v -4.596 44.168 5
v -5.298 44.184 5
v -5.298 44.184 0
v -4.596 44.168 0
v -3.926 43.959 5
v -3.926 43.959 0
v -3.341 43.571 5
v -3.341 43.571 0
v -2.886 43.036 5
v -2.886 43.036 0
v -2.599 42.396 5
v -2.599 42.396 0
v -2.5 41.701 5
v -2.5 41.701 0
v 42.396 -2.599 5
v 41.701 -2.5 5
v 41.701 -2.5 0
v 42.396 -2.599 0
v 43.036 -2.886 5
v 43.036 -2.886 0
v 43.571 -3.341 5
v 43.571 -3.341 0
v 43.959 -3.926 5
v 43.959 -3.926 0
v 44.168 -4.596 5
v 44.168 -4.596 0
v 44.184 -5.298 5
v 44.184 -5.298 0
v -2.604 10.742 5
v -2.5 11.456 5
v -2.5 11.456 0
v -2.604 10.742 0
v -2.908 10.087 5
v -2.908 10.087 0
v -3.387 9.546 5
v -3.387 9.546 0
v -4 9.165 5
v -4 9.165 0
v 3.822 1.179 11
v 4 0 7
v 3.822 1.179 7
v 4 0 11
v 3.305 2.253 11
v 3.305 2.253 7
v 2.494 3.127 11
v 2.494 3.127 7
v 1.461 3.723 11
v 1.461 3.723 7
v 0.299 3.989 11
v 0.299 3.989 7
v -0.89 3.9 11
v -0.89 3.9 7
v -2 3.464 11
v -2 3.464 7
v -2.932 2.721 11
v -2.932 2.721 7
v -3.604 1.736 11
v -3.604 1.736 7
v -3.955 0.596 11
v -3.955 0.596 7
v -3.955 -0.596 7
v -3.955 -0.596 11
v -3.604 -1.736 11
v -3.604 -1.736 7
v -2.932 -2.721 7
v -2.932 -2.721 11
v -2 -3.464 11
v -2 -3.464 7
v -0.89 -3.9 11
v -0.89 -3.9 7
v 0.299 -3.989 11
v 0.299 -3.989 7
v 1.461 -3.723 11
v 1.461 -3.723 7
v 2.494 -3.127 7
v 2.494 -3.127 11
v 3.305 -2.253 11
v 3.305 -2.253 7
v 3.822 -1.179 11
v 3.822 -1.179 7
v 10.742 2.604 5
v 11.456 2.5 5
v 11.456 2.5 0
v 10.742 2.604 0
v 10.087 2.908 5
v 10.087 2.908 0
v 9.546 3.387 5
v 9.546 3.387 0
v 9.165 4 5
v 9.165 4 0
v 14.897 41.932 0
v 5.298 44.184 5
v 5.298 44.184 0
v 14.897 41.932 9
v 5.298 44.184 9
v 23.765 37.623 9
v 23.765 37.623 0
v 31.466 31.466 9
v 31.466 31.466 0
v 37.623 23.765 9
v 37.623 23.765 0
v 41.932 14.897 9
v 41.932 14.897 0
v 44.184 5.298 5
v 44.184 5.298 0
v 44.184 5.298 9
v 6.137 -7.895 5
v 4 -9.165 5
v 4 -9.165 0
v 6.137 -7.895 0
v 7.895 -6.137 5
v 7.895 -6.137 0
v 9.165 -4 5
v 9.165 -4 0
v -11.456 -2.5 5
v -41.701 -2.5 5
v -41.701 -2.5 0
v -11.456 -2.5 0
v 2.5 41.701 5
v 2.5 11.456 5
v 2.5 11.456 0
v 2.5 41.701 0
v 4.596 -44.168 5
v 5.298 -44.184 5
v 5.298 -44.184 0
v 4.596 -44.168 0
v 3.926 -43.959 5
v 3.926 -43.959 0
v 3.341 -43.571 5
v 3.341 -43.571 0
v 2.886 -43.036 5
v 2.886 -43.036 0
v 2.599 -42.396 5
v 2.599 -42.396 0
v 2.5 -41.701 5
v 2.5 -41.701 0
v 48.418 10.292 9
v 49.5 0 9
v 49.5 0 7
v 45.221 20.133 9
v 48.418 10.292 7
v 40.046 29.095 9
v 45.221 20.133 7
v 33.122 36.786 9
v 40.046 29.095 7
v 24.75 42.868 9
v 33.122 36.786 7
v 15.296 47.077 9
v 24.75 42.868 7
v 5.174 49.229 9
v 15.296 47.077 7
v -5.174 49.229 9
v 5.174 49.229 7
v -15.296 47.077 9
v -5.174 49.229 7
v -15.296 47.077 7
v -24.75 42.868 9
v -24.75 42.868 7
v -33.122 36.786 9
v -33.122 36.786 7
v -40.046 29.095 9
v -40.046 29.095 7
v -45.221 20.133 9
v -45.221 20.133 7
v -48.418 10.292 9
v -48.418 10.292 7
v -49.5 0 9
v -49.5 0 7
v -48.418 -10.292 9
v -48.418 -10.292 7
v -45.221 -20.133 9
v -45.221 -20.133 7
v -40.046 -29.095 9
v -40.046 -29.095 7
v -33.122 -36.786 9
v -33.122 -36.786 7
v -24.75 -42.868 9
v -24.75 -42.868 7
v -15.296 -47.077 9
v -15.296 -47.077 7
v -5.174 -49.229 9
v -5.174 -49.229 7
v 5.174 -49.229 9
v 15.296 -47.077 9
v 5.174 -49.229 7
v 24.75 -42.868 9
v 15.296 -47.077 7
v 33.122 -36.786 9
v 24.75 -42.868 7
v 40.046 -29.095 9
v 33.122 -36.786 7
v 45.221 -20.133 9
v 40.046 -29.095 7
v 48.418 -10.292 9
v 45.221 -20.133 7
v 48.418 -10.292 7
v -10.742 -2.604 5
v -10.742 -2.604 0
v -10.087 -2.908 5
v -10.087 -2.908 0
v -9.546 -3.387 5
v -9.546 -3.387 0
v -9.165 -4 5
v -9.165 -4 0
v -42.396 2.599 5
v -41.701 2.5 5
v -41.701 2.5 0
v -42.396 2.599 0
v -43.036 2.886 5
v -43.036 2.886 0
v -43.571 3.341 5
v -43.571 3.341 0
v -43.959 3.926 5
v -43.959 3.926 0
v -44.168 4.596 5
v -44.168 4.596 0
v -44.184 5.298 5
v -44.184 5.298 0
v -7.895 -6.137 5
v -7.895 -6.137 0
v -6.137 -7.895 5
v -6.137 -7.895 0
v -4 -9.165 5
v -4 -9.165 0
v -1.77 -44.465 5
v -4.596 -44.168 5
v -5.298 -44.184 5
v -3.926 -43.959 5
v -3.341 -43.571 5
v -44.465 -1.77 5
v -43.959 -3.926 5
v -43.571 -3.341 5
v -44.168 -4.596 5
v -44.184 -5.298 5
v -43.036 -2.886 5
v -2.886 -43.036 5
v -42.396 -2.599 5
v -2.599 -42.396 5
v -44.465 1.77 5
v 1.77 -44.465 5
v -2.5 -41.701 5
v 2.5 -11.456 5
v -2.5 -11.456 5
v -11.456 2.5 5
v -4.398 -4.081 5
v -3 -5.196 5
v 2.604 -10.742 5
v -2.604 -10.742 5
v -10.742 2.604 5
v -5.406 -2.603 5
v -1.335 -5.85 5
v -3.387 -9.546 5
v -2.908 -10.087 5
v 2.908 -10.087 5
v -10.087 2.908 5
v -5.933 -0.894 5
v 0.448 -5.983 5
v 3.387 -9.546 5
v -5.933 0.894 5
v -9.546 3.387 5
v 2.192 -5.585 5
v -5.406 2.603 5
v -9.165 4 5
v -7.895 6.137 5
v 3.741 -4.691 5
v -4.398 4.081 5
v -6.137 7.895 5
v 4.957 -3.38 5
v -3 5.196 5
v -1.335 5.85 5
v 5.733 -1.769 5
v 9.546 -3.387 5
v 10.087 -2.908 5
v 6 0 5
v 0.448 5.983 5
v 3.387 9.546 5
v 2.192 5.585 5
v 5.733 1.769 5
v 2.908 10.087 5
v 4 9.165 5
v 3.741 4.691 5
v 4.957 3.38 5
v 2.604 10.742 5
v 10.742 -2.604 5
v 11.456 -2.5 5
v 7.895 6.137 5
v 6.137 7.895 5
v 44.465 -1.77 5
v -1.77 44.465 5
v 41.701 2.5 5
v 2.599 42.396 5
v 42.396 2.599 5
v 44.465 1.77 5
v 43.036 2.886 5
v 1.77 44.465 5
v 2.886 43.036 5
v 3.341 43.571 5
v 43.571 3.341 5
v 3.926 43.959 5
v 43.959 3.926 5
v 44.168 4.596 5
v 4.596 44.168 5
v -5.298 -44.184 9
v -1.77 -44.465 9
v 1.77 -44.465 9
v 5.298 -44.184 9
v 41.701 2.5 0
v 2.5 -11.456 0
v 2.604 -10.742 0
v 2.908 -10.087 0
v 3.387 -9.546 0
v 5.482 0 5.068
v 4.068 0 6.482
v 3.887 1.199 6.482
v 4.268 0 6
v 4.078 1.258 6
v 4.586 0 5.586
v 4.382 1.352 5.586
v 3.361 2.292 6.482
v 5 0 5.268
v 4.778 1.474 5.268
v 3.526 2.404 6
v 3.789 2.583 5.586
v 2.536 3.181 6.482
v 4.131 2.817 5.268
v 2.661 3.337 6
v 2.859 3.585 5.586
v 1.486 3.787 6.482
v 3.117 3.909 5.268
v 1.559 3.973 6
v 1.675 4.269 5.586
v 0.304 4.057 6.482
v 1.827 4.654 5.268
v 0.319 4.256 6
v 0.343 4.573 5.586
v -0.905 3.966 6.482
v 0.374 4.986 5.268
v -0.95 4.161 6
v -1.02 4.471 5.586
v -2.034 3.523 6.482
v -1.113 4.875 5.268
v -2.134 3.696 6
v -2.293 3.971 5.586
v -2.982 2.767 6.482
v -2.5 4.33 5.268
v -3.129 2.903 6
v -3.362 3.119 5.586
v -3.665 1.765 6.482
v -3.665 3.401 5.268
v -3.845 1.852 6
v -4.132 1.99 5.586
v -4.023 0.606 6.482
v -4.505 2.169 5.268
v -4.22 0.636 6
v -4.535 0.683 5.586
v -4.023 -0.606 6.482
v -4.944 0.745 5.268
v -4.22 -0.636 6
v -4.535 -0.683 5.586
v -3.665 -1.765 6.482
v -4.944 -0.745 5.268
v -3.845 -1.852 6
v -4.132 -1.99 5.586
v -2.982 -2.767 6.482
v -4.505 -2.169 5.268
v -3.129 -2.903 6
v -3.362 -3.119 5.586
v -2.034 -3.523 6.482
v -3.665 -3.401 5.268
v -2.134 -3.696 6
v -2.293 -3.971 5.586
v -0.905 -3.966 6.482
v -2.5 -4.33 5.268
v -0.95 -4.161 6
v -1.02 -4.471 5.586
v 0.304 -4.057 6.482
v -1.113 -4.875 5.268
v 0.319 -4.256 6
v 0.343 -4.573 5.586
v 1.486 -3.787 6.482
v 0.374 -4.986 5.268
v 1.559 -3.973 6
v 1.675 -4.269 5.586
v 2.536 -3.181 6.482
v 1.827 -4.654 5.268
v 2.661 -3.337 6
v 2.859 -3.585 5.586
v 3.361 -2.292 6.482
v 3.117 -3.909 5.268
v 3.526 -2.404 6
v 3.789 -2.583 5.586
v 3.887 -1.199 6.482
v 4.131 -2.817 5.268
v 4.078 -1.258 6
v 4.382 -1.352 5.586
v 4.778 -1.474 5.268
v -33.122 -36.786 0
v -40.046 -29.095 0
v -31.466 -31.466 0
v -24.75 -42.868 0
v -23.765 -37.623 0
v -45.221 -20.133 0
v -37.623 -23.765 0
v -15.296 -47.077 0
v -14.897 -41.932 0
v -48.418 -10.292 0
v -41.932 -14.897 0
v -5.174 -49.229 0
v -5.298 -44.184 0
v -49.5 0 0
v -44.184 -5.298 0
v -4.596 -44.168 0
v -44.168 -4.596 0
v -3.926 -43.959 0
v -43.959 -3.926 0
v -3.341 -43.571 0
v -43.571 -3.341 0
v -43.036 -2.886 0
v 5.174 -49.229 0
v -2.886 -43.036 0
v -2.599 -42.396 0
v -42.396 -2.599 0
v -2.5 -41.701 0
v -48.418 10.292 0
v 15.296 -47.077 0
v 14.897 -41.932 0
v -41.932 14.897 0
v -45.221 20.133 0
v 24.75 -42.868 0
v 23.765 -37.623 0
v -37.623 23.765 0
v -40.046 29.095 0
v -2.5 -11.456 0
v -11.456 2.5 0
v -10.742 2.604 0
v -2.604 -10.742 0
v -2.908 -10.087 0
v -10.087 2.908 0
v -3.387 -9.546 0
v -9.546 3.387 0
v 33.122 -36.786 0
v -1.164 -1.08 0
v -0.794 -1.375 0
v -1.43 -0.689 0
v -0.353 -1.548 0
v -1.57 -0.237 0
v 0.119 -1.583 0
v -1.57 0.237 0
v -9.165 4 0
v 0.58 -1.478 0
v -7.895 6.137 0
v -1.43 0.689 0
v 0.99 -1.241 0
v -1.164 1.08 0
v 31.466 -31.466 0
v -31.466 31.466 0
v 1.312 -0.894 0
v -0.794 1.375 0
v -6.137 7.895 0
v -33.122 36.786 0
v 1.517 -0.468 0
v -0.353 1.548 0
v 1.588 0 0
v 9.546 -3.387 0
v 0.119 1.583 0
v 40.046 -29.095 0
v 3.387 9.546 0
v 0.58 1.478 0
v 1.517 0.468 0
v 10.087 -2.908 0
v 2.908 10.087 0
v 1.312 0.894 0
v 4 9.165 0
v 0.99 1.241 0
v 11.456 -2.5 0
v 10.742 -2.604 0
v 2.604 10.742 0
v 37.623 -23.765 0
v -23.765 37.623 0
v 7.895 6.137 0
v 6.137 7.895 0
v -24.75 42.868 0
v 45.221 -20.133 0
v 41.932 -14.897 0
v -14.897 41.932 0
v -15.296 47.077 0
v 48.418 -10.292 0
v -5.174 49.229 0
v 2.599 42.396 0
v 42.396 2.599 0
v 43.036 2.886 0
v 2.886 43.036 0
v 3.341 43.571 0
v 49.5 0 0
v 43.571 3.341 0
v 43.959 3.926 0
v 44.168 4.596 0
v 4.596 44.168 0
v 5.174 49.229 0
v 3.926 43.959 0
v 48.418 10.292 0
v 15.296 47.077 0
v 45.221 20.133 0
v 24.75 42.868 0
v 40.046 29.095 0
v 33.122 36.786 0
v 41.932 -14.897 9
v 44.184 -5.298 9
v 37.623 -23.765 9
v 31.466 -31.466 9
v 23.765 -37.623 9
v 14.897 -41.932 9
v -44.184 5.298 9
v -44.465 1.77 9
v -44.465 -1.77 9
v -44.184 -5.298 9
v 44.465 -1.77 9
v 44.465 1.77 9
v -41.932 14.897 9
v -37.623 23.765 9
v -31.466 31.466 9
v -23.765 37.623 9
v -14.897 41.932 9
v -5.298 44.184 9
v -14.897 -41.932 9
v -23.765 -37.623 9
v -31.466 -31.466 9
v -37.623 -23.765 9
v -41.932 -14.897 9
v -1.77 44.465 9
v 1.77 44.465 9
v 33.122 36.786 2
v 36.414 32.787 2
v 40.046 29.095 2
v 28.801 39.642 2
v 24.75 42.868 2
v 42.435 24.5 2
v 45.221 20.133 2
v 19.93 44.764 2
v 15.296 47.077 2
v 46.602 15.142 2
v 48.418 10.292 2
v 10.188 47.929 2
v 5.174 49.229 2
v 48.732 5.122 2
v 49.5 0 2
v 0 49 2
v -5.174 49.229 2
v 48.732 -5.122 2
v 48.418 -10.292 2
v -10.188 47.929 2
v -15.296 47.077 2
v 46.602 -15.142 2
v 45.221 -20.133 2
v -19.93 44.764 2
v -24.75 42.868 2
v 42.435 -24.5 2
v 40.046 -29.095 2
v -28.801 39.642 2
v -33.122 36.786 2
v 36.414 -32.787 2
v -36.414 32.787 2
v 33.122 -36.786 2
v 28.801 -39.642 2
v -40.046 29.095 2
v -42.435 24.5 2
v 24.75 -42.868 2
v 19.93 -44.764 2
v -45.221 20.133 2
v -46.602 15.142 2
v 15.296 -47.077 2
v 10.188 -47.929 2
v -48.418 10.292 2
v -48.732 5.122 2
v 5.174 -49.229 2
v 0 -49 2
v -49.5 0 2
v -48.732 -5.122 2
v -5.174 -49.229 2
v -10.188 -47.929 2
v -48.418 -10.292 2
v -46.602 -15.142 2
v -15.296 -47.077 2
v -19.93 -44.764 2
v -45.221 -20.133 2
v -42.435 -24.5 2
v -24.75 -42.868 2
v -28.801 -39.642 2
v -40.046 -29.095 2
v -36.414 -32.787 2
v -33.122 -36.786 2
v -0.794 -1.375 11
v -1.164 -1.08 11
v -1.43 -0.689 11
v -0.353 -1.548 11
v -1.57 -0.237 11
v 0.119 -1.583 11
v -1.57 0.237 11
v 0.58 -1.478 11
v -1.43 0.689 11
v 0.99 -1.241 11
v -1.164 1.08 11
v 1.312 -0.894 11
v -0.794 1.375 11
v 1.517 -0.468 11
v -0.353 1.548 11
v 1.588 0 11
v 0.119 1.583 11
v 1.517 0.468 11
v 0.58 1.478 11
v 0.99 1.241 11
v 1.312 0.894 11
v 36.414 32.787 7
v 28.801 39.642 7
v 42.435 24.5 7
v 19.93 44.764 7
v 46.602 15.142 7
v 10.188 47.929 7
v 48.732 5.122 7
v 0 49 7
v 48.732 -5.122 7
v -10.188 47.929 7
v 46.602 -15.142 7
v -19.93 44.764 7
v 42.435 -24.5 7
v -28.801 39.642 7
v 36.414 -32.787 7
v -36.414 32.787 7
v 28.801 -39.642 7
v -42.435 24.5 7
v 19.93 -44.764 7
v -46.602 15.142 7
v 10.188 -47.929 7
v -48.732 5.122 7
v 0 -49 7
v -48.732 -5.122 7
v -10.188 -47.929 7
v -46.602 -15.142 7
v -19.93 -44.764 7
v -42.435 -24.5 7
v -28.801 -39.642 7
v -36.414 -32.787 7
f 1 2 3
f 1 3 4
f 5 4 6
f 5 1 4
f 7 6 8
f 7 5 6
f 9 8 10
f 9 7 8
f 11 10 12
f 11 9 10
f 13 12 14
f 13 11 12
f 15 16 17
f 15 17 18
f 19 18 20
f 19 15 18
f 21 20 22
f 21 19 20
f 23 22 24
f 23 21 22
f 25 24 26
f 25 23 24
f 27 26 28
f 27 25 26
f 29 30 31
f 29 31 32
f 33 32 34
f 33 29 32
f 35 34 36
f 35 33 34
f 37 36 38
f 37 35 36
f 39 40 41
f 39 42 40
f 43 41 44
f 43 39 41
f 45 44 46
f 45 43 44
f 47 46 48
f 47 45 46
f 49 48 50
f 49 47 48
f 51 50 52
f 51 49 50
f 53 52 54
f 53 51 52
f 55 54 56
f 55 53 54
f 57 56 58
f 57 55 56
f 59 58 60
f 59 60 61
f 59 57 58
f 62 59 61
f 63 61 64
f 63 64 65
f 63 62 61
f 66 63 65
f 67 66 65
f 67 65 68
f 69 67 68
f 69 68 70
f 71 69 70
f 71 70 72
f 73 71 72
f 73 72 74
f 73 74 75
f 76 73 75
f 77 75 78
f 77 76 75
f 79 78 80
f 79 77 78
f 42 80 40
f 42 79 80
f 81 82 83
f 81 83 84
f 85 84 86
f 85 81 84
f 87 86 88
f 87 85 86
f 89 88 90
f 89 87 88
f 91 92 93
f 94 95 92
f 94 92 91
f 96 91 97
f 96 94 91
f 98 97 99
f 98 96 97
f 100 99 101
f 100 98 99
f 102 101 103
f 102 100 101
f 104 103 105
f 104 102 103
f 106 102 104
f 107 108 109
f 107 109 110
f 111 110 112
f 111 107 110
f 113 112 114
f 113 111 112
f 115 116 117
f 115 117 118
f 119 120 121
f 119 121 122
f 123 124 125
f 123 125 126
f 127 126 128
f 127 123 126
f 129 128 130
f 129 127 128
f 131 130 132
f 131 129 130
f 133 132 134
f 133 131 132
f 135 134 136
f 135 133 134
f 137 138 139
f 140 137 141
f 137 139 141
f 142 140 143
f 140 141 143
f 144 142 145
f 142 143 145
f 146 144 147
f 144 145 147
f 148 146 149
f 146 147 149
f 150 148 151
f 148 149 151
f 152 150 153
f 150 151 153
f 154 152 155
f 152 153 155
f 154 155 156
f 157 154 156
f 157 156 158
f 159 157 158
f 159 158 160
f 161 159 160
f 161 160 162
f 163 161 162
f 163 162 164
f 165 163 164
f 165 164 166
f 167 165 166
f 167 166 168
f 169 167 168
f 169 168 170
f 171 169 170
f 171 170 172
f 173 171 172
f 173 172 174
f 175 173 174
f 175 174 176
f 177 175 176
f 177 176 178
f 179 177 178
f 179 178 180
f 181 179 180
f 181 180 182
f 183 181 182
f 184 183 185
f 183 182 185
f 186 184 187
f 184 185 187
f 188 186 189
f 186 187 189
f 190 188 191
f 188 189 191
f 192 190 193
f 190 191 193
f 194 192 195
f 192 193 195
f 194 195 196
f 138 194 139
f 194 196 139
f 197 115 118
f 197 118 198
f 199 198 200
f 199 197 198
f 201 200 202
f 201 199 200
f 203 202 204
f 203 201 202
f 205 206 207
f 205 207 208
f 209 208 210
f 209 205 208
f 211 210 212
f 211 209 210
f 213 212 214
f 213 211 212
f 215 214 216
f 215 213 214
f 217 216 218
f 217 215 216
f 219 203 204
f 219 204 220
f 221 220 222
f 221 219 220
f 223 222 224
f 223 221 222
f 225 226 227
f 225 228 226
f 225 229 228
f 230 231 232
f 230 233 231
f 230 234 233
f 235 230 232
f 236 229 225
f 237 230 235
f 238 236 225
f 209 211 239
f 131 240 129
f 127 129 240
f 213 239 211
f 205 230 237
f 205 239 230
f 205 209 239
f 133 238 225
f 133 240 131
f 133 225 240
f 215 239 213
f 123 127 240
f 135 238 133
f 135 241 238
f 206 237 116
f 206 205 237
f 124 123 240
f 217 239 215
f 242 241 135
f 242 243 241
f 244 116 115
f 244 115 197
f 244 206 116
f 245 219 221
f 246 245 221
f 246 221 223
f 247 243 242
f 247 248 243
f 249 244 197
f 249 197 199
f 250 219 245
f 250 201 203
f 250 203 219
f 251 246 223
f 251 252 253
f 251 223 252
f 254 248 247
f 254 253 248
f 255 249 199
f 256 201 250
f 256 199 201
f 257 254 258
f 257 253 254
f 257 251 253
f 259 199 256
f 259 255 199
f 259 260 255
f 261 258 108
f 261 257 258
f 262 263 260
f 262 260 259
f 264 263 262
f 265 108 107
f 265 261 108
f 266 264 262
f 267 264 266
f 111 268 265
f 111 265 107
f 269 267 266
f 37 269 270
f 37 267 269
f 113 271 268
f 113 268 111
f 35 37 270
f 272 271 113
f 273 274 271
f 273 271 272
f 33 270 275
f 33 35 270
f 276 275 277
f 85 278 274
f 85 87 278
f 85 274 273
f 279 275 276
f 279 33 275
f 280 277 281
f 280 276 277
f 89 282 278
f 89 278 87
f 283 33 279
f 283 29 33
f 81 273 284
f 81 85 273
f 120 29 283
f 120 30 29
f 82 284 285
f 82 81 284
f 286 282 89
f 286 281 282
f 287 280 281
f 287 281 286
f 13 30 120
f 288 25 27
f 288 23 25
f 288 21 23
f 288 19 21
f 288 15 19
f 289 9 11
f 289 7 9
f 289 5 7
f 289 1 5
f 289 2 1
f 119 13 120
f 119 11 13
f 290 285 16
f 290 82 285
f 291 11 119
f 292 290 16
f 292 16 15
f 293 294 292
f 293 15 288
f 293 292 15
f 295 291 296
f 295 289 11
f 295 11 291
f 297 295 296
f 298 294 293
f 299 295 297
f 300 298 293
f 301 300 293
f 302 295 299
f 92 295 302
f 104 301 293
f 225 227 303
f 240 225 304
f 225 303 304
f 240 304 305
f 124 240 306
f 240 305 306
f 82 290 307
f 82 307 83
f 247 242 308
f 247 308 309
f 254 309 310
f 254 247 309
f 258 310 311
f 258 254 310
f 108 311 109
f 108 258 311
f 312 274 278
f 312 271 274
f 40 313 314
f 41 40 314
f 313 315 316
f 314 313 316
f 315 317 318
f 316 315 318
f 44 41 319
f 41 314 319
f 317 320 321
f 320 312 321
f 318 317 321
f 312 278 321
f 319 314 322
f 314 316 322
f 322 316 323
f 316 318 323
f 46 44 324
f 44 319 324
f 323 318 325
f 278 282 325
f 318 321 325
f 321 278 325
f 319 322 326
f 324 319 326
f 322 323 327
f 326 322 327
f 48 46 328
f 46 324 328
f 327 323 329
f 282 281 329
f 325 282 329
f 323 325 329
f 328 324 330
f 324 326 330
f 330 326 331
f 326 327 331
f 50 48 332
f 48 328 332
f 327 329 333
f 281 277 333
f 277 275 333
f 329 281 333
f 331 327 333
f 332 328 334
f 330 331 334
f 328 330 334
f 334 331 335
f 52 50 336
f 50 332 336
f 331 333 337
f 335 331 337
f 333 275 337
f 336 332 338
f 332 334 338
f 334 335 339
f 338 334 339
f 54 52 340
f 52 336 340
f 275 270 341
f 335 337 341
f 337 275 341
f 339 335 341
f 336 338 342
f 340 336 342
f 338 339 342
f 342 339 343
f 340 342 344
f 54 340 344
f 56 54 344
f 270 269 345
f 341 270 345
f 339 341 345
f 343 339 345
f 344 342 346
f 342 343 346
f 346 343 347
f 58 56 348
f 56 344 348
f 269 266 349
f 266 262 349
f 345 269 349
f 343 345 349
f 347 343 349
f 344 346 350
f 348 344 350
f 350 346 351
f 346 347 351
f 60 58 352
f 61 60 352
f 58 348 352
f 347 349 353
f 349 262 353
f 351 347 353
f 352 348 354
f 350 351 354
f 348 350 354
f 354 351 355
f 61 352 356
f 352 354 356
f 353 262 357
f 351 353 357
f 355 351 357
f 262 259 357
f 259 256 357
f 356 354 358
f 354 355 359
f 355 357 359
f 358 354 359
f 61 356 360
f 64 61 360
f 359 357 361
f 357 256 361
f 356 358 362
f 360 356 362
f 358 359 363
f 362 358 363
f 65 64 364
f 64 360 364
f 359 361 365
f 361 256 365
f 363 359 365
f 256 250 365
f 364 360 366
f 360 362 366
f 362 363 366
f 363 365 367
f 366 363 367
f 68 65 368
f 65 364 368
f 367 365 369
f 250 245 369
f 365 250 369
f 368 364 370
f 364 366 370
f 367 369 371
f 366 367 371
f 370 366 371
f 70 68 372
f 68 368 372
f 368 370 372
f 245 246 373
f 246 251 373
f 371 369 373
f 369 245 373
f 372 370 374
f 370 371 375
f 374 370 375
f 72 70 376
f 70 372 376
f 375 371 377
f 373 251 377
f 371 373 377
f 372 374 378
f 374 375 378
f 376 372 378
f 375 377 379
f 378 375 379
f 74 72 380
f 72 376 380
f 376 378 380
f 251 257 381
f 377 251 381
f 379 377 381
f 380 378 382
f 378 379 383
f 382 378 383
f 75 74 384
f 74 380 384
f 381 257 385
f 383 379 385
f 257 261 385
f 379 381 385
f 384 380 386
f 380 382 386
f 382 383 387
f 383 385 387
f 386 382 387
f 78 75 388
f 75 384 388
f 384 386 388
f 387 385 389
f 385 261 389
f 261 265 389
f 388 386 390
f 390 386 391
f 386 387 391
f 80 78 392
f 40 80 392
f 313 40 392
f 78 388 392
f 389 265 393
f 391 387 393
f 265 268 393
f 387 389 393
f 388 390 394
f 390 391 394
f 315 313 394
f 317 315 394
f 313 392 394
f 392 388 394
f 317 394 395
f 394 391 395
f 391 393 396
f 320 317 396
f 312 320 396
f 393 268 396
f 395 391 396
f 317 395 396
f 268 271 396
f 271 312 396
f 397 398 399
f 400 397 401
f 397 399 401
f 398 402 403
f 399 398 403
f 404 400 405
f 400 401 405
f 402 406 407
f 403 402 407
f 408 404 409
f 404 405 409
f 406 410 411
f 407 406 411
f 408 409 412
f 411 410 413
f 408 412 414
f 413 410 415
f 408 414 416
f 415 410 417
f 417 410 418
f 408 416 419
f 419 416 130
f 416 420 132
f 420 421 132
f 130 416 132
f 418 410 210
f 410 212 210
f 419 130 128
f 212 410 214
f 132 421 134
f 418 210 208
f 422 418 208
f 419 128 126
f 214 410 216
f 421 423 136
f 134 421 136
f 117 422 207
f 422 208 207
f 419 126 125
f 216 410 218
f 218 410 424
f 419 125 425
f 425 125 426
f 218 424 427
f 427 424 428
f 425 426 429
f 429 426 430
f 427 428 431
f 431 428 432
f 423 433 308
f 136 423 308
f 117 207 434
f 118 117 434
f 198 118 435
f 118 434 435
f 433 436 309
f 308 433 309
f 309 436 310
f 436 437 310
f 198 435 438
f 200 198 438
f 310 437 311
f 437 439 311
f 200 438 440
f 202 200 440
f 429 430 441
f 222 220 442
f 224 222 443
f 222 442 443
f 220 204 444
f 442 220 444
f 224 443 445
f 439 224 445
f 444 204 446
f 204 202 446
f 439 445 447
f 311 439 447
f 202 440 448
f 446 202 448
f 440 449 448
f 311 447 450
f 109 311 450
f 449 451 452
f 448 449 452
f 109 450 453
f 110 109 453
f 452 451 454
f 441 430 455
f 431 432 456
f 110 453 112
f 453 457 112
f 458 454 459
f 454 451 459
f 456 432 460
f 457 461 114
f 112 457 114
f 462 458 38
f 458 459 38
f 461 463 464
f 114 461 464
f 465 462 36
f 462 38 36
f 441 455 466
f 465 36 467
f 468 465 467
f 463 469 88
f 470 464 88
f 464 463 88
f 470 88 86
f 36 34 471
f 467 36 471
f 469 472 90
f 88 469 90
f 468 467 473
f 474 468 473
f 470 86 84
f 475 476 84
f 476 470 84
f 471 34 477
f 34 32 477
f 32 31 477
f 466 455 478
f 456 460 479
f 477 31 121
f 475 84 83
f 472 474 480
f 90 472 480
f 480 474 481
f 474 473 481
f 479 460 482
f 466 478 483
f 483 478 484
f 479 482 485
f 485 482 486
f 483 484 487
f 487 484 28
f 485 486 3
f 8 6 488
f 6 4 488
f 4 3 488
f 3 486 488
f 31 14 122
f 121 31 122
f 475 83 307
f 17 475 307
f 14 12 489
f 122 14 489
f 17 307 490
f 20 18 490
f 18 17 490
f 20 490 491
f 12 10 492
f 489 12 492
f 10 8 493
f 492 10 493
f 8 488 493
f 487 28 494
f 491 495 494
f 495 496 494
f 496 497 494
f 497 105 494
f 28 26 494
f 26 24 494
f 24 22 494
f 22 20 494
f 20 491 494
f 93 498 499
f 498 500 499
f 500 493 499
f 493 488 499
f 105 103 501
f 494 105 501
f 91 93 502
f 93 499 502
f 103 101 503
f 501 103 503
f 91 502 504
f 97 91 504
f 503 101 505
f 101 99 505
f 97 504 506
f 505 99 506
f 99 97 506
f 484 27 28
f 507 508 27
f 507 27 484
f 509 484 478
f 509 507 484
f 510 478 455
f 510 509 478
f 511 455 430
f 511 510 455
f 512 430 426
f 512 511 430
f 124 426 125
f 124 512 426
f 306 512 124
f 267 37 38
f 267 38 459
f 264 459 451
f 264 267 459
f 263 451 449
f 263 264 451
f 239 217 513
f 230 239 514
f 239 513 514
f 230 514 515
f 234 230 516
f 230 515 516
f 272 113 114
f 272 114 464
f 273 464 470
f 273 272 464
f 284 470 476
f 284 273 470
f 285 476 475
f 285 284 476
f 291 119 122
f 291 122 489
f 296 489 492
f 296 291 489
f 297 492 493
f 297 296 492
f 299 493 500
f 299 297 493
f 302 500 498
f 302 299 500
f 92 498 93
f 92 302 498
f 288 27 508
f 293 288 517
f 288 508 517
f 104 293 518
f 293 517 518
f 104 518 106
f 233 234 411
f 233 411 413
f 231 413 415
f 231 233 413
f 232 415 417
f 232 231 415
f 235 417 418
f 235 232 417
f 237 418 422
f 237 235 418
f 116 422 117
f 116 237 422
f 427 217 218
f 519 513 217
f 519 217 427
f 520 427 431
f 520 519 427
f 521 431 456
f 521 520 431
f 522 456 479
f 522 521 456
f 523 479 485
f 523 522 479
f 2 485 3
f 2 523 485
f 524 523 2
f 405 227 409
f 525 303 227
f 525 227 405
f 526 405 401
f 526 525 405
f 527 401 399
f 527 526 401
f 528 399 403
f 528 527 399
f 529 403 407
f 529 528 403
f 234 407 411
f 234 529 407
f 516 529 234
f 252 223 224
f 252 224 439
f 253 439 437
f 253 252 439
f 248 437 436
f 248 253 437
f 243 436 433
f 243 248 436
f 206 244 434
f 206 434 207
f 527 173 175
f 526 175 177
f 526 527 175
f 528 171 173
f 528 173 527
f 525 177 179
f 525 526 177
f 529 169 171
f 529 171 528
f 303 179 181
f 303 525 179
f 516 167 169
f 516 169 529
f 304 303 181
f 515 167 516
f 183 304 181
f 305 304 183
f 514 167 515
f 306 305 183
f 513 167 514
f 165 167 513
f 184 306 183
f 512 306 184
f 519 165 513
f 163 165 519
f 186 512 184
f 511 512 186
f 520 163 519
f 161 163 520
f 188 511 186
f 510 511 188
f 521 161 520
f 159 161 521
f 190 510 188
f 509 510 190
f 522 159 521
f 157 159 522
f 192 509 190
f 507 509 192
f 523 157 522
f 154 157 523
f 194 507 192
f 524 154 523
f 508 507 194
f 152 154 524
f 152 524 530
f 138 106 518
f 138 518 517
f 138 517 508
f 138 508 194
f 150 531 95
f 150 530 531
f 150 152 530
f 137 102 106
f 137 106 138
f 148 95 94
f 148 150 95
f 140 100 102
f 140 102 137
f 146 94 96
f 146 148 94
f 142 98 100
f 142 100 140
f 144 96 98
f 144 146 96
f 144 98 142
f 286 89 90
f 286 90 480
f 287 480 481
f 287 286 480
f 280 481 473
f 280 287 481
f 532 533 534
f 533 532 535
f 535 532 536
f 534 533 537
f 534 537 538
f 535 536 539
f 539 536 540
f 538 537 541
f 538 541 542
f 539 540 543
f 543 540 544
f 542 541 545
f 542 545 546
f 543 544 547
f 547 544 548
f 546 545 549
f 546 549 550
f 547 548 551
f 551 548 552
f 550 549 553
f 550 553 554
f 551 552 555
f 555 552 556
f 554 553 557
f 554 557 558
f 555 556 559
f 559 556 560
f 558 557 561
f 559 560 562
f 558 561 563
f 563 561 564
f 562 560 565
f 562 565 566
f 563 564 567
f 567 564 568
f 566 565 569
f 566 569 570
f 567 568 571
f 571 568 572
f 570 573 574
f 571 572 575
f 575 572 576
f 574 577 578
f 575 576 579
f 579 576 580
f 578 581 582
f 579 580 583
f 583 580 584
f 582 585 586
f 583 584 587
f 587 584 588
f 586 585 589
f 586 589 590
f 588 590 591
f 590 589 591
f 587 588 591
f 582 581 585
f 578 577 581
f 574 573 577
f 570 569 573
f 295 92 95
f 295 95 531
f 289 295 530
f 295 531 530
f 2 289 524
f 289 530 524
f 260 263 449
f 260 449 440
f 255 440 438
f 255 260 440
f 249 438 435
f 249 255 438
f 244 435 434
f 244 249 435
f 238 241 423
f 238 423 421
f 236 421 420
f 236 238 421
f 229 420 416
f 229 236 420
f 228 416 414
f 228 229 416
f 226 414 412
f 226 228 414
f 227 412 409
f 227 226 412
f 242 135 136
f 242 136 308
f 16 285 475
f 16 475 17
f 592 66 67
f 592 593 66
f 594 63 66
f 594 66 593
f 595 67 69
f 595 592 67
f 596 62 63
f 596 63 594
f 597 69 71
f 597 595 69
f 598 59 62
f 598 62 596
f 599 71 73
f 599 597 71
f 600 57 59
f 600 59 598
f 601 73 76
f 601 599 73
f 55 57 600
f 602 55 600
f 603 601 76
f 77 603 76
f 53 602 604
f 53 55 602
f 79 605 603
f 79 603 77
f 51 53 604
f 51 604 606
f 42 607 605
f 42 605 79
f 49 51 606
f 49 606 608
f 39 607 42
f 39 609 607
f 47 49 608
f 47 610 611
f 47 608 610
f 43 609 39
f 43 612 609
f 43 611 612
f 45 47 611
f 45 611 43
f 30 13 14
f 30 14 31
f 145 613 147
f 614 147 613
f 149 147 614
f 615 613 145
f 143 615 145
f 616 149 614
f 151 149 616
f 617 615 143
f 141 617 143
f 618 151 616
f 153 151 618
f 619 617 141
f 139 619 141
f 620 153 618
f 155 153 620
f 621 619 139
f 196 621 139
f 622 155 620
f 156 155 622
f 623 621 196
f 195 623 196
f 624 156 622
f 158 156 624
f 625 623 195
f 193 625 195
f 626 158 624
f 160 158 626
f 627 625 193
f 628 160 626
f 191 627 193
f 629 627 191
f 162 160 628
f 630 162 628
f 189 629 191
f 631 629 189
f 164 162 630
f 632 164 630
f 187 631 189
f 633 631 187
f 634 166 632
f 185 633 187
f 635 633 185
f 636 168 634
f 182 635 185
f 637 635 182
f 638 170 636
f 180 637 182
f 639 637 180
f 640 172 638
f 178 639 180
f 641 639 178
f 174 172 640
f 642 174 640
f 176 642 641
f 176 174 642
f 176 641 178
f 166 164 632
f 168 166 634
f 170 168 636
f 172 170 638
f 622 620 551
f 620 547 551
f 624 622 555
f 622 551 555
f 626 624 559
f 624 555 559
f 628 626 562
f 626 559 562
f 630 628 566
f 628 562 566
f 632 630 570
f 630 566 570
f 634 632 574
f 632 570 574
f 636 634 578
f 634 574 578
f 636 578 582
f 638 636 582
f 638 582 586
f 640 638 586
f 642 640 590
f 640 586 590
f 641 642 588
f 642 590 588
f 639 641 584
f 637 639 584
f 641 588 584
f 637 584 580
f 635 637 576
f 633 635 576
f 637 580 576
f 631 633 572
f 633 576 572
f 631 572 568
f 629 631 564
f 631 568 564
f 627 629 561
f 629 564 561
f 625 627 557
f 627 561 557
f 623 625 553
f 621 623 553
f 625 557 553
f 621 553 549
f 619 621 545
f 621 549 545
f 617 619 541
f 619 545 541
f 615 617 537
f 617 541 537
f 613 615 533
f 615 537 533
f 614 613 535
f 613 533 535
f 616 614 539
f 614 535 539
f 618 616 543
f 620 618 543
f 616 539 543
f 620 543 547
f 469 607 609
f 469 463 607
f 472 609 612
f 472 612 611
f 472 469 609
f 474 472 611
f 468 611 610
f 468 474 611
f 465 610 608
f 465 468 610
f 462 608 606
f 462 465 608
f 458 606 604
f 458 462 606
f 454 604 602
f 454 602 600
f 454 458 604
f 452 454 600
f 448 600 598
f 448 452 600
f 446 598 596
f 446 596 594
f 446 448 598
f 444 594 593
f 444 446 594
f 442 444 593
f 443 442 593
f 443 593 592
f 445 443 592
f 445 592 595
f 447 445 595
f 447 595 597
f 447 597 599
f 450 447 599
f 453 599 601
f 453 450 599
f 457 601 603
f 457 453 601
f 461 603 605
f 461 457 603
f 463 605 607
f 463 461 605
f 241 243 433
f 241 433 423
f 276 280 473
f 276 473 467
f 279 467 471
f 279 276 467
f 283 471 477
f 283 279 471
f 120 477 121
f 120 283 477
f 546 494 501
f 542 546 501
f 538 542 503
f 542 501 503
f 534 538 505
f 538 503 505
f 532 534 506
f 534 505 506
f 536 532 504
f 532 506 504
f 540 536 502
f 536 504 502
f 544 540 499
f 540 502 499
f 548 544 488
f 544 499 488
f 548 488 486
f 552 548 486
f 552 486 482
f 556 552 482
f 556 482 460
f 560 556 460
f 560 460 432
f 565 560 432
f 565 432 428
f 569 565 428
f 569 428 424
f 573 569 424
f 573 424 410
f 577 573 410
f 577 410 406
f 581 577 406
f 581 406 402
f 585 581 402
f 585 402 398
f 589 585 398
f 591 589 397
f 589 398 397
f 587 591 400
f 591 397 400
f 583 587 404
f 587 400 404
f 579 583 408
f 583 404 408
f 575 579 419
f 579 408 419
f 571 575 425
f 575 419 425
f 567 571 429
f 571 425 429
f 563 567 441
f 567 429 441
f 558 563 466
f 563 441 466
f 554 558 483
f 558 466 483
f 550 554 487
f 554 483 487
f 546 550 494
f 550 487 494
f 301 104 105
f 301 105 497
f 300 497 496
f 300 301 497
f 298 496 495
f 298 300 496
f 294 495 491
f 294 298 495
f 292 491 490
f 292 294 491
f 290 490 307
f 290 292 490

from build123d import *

# Parameters (mm, degrees)
SKETCH1_R           = 49.5
SKETCH1_R_2         = 1.5875
BOSS_EXTRUDE1_DEPTH = 9
CUT_EXTRUDE1_DEPTH  = 10
SKETCH3_R           = 44.5
SKETCH3_R_2         = 4
CUT_EXTRUDE2_DEPTH  = 4
SKETCH4_R           = 4
SKETCH4_R_2         = 1.5875
BOSS_EXTRUDE2_DEPTH = 2
FILLET1_R           = 2
SKETCH5_W           = 5
SKETCH5_H           = 0.5


with BuildPart() as part:
    # Sketch1 → Boss-Extrude1 (new body)
    with BuildSketch(Plane.XY):
        Circle(SKETCH1_R)
        Circle(SKETCH1_R_2, mode=Mode.SUBTRACT)
    extrude(amount=BOSS_EXTRUDE1_DEPTH)

    # Sketch2 → Cut-Extrude1 (cut, through all)
    with BuildSketch(Plane.XY.offset(9)):
        with BuildLine():
            Line((2.5, 11.456439237), (2.5, 41.701318924))
            ThreePointArc((2.5, 41.701318924), (3.340790492, 43.571352028), (5.297619048, 44.183540289))
            ThreePointArc((5.297619048, 44.183540289), (31.466251763, 31.466251763), (44.183540289, 5.297619048))
            ThreePointArc((44.183540289, 5.297619048), (43.571352028, 3.340790492), (41.701318924, 2.5))
            Line((41.701318924, 2.5), (11.456439237, 2.5))
            ThreePointArc((11.456439237, 2.5), (10.087132844, 2.908349934), (9.16515139, 4))
            ThreePointArc((9.16515139, 4), (7.071067812, 7.071067812), (4, 9.16515139))
            ThreePointArc((4, 9.16515139), (2.908349934, 10.087132844), (2.5, 11.456439237))
        make_face()
        with BuildLine():
            Line((-11.456439237, 2.5), (-41.701318924, 2.5))
            ThreePointArc((-41.701318924, 2.5), (-43.571352028, 3.340790492), (-44.183540289, 5.297619048))
            ThreePointArc((-44.183540289, 5.297619048), (-31.466251763, 31.466251763), (-5.297619048, 44.183540289))
            ThreePointArc((-5.297619048, 44.183540289), (-3.340790492, 43.571352028), (-2.5, 41.701318924))
            Line((-2.5, 41.701318924), (-2.5, 11.456439237))
            ThreePointArc((-2.5, 11.456439237), (-2.908349934, 10.087132844), (-4, 9.16515139))
            ThreePointArc((-4, 9.16515139), (-7.071067812, 7.071067812), (-9.16515139, 4))
            ThreePointArc((-9.16515139, 4), (-10.087132844, 2.908349934), (-11.456439237, 2.5))
        make_face()
        with BuildLine():
            Line((-2.5, -11.456439237), (-2.5, -41.701318924))
            ThreePointArc((-2.5, -41.701318924), (-3.340790492, -43.571352028), (-5.297619048, -44.183540289))
            ThreePointArc((-5.297619048, -44.183540289), (-31.466251763, -31.466251763), (-44.183540289, -5.297619048))
            ThreePointArc((-44.183540289, -5.297619048), (-43.571352028, -3.340790492), (-41.701318924, -2.5))
            Line((-41.701318924, -2.5), (-11.456439237, -2.5))
            ThreePointArc((-11.456439237, -2.5), (-10.087132844, -2.908349934), (-9.16515139, -4))
            ThreePointArc((-9.16515139, -4), (-7.071067812, -7.071067812), (-4, -9.16515139))
            ThreePointArc((-4, -9.16515139), (-2.908349934, -10.087132844), (-2.5, -11.456439237))
        make_face()
        with BuildLine():
            Line((11.456439237, -2.5), (41.701318924, -2.5))
            ThreePointArc((41.701318924, -2.5), (43.571352028, -3.340790492), (44.183540289, -5.297619048))
            ThreePointArc((44.183540289, -5.297619048), (31.466251763, -31.466251763), (5.297619048, -44.183540289))
            ThreePointArc((5.297619048, -44.183540289), (3.340790492, -43.571352028), (2.5, -41.701318924))
            Line((2.5, -41.701318924), (2.5, -11.456439237))
            ThreePointArc((2.5, -11.456439237), (2.908349934, -10.087132844), (4, -9.16515139))
            ThreePointArc((4, -9.16515139), (7.071067812, -7.071067812), (9.16515139, -4))
            ThreePointArc((9.16515139, -4), (10.087132844, -2.908349934), (11.456439237, -2.5))
        make_face()
    extrude(amount=-CUT_EXTRUDE1_DEPTH, mode=Mode.SUBTRACT)

    # Sketch3 → Cut-Extrude2 (cut)
    with BuildSketch(Plane.XY.offset(9)):
        Circle(SKETCH3_R)
        Circle(SKETCH3_R_2, mode=Mode.SUBTRACT)
    extrude(amount=-CUT_EXTRUDE2_DEPTH, mode=Mode.SUBTRACT)

    # Sketch4 → Boss-Extrude2 (add)
    with BuildSketch(Plane.XY.offset(9)):
        Circle(SKETCH4_R)
        Circle(SKETCH4_R_2, mode=Mode.SUBTRACT)
    extrude(amount=BOSS_EXTRUDE2_DEPTH)

    # Fillet1
    fillet1_edges = [part.edges().sort_by_distance(p)[0] for p in [
        (-4, 0, 5),
    ]]
    fillet(fillet1_edges, radius=FILLET1_R)

    # Sketch5 → Cut-Revolve1 (revolve, cut)
    with BuildSketch(Plane(origin=(0, 0, 0), x_dir=(0, 0, -1), z_dir=(1, 0, 0))):
        with Locations((-4.5, 49.25)):
            Rectangle(SKETCH5_W, SKETCH5_H)
    revolve(axis=Axis((0, 0, 0), (0, 0, 1)), mode=Mode.SUBTRACT)


solid = part.part
